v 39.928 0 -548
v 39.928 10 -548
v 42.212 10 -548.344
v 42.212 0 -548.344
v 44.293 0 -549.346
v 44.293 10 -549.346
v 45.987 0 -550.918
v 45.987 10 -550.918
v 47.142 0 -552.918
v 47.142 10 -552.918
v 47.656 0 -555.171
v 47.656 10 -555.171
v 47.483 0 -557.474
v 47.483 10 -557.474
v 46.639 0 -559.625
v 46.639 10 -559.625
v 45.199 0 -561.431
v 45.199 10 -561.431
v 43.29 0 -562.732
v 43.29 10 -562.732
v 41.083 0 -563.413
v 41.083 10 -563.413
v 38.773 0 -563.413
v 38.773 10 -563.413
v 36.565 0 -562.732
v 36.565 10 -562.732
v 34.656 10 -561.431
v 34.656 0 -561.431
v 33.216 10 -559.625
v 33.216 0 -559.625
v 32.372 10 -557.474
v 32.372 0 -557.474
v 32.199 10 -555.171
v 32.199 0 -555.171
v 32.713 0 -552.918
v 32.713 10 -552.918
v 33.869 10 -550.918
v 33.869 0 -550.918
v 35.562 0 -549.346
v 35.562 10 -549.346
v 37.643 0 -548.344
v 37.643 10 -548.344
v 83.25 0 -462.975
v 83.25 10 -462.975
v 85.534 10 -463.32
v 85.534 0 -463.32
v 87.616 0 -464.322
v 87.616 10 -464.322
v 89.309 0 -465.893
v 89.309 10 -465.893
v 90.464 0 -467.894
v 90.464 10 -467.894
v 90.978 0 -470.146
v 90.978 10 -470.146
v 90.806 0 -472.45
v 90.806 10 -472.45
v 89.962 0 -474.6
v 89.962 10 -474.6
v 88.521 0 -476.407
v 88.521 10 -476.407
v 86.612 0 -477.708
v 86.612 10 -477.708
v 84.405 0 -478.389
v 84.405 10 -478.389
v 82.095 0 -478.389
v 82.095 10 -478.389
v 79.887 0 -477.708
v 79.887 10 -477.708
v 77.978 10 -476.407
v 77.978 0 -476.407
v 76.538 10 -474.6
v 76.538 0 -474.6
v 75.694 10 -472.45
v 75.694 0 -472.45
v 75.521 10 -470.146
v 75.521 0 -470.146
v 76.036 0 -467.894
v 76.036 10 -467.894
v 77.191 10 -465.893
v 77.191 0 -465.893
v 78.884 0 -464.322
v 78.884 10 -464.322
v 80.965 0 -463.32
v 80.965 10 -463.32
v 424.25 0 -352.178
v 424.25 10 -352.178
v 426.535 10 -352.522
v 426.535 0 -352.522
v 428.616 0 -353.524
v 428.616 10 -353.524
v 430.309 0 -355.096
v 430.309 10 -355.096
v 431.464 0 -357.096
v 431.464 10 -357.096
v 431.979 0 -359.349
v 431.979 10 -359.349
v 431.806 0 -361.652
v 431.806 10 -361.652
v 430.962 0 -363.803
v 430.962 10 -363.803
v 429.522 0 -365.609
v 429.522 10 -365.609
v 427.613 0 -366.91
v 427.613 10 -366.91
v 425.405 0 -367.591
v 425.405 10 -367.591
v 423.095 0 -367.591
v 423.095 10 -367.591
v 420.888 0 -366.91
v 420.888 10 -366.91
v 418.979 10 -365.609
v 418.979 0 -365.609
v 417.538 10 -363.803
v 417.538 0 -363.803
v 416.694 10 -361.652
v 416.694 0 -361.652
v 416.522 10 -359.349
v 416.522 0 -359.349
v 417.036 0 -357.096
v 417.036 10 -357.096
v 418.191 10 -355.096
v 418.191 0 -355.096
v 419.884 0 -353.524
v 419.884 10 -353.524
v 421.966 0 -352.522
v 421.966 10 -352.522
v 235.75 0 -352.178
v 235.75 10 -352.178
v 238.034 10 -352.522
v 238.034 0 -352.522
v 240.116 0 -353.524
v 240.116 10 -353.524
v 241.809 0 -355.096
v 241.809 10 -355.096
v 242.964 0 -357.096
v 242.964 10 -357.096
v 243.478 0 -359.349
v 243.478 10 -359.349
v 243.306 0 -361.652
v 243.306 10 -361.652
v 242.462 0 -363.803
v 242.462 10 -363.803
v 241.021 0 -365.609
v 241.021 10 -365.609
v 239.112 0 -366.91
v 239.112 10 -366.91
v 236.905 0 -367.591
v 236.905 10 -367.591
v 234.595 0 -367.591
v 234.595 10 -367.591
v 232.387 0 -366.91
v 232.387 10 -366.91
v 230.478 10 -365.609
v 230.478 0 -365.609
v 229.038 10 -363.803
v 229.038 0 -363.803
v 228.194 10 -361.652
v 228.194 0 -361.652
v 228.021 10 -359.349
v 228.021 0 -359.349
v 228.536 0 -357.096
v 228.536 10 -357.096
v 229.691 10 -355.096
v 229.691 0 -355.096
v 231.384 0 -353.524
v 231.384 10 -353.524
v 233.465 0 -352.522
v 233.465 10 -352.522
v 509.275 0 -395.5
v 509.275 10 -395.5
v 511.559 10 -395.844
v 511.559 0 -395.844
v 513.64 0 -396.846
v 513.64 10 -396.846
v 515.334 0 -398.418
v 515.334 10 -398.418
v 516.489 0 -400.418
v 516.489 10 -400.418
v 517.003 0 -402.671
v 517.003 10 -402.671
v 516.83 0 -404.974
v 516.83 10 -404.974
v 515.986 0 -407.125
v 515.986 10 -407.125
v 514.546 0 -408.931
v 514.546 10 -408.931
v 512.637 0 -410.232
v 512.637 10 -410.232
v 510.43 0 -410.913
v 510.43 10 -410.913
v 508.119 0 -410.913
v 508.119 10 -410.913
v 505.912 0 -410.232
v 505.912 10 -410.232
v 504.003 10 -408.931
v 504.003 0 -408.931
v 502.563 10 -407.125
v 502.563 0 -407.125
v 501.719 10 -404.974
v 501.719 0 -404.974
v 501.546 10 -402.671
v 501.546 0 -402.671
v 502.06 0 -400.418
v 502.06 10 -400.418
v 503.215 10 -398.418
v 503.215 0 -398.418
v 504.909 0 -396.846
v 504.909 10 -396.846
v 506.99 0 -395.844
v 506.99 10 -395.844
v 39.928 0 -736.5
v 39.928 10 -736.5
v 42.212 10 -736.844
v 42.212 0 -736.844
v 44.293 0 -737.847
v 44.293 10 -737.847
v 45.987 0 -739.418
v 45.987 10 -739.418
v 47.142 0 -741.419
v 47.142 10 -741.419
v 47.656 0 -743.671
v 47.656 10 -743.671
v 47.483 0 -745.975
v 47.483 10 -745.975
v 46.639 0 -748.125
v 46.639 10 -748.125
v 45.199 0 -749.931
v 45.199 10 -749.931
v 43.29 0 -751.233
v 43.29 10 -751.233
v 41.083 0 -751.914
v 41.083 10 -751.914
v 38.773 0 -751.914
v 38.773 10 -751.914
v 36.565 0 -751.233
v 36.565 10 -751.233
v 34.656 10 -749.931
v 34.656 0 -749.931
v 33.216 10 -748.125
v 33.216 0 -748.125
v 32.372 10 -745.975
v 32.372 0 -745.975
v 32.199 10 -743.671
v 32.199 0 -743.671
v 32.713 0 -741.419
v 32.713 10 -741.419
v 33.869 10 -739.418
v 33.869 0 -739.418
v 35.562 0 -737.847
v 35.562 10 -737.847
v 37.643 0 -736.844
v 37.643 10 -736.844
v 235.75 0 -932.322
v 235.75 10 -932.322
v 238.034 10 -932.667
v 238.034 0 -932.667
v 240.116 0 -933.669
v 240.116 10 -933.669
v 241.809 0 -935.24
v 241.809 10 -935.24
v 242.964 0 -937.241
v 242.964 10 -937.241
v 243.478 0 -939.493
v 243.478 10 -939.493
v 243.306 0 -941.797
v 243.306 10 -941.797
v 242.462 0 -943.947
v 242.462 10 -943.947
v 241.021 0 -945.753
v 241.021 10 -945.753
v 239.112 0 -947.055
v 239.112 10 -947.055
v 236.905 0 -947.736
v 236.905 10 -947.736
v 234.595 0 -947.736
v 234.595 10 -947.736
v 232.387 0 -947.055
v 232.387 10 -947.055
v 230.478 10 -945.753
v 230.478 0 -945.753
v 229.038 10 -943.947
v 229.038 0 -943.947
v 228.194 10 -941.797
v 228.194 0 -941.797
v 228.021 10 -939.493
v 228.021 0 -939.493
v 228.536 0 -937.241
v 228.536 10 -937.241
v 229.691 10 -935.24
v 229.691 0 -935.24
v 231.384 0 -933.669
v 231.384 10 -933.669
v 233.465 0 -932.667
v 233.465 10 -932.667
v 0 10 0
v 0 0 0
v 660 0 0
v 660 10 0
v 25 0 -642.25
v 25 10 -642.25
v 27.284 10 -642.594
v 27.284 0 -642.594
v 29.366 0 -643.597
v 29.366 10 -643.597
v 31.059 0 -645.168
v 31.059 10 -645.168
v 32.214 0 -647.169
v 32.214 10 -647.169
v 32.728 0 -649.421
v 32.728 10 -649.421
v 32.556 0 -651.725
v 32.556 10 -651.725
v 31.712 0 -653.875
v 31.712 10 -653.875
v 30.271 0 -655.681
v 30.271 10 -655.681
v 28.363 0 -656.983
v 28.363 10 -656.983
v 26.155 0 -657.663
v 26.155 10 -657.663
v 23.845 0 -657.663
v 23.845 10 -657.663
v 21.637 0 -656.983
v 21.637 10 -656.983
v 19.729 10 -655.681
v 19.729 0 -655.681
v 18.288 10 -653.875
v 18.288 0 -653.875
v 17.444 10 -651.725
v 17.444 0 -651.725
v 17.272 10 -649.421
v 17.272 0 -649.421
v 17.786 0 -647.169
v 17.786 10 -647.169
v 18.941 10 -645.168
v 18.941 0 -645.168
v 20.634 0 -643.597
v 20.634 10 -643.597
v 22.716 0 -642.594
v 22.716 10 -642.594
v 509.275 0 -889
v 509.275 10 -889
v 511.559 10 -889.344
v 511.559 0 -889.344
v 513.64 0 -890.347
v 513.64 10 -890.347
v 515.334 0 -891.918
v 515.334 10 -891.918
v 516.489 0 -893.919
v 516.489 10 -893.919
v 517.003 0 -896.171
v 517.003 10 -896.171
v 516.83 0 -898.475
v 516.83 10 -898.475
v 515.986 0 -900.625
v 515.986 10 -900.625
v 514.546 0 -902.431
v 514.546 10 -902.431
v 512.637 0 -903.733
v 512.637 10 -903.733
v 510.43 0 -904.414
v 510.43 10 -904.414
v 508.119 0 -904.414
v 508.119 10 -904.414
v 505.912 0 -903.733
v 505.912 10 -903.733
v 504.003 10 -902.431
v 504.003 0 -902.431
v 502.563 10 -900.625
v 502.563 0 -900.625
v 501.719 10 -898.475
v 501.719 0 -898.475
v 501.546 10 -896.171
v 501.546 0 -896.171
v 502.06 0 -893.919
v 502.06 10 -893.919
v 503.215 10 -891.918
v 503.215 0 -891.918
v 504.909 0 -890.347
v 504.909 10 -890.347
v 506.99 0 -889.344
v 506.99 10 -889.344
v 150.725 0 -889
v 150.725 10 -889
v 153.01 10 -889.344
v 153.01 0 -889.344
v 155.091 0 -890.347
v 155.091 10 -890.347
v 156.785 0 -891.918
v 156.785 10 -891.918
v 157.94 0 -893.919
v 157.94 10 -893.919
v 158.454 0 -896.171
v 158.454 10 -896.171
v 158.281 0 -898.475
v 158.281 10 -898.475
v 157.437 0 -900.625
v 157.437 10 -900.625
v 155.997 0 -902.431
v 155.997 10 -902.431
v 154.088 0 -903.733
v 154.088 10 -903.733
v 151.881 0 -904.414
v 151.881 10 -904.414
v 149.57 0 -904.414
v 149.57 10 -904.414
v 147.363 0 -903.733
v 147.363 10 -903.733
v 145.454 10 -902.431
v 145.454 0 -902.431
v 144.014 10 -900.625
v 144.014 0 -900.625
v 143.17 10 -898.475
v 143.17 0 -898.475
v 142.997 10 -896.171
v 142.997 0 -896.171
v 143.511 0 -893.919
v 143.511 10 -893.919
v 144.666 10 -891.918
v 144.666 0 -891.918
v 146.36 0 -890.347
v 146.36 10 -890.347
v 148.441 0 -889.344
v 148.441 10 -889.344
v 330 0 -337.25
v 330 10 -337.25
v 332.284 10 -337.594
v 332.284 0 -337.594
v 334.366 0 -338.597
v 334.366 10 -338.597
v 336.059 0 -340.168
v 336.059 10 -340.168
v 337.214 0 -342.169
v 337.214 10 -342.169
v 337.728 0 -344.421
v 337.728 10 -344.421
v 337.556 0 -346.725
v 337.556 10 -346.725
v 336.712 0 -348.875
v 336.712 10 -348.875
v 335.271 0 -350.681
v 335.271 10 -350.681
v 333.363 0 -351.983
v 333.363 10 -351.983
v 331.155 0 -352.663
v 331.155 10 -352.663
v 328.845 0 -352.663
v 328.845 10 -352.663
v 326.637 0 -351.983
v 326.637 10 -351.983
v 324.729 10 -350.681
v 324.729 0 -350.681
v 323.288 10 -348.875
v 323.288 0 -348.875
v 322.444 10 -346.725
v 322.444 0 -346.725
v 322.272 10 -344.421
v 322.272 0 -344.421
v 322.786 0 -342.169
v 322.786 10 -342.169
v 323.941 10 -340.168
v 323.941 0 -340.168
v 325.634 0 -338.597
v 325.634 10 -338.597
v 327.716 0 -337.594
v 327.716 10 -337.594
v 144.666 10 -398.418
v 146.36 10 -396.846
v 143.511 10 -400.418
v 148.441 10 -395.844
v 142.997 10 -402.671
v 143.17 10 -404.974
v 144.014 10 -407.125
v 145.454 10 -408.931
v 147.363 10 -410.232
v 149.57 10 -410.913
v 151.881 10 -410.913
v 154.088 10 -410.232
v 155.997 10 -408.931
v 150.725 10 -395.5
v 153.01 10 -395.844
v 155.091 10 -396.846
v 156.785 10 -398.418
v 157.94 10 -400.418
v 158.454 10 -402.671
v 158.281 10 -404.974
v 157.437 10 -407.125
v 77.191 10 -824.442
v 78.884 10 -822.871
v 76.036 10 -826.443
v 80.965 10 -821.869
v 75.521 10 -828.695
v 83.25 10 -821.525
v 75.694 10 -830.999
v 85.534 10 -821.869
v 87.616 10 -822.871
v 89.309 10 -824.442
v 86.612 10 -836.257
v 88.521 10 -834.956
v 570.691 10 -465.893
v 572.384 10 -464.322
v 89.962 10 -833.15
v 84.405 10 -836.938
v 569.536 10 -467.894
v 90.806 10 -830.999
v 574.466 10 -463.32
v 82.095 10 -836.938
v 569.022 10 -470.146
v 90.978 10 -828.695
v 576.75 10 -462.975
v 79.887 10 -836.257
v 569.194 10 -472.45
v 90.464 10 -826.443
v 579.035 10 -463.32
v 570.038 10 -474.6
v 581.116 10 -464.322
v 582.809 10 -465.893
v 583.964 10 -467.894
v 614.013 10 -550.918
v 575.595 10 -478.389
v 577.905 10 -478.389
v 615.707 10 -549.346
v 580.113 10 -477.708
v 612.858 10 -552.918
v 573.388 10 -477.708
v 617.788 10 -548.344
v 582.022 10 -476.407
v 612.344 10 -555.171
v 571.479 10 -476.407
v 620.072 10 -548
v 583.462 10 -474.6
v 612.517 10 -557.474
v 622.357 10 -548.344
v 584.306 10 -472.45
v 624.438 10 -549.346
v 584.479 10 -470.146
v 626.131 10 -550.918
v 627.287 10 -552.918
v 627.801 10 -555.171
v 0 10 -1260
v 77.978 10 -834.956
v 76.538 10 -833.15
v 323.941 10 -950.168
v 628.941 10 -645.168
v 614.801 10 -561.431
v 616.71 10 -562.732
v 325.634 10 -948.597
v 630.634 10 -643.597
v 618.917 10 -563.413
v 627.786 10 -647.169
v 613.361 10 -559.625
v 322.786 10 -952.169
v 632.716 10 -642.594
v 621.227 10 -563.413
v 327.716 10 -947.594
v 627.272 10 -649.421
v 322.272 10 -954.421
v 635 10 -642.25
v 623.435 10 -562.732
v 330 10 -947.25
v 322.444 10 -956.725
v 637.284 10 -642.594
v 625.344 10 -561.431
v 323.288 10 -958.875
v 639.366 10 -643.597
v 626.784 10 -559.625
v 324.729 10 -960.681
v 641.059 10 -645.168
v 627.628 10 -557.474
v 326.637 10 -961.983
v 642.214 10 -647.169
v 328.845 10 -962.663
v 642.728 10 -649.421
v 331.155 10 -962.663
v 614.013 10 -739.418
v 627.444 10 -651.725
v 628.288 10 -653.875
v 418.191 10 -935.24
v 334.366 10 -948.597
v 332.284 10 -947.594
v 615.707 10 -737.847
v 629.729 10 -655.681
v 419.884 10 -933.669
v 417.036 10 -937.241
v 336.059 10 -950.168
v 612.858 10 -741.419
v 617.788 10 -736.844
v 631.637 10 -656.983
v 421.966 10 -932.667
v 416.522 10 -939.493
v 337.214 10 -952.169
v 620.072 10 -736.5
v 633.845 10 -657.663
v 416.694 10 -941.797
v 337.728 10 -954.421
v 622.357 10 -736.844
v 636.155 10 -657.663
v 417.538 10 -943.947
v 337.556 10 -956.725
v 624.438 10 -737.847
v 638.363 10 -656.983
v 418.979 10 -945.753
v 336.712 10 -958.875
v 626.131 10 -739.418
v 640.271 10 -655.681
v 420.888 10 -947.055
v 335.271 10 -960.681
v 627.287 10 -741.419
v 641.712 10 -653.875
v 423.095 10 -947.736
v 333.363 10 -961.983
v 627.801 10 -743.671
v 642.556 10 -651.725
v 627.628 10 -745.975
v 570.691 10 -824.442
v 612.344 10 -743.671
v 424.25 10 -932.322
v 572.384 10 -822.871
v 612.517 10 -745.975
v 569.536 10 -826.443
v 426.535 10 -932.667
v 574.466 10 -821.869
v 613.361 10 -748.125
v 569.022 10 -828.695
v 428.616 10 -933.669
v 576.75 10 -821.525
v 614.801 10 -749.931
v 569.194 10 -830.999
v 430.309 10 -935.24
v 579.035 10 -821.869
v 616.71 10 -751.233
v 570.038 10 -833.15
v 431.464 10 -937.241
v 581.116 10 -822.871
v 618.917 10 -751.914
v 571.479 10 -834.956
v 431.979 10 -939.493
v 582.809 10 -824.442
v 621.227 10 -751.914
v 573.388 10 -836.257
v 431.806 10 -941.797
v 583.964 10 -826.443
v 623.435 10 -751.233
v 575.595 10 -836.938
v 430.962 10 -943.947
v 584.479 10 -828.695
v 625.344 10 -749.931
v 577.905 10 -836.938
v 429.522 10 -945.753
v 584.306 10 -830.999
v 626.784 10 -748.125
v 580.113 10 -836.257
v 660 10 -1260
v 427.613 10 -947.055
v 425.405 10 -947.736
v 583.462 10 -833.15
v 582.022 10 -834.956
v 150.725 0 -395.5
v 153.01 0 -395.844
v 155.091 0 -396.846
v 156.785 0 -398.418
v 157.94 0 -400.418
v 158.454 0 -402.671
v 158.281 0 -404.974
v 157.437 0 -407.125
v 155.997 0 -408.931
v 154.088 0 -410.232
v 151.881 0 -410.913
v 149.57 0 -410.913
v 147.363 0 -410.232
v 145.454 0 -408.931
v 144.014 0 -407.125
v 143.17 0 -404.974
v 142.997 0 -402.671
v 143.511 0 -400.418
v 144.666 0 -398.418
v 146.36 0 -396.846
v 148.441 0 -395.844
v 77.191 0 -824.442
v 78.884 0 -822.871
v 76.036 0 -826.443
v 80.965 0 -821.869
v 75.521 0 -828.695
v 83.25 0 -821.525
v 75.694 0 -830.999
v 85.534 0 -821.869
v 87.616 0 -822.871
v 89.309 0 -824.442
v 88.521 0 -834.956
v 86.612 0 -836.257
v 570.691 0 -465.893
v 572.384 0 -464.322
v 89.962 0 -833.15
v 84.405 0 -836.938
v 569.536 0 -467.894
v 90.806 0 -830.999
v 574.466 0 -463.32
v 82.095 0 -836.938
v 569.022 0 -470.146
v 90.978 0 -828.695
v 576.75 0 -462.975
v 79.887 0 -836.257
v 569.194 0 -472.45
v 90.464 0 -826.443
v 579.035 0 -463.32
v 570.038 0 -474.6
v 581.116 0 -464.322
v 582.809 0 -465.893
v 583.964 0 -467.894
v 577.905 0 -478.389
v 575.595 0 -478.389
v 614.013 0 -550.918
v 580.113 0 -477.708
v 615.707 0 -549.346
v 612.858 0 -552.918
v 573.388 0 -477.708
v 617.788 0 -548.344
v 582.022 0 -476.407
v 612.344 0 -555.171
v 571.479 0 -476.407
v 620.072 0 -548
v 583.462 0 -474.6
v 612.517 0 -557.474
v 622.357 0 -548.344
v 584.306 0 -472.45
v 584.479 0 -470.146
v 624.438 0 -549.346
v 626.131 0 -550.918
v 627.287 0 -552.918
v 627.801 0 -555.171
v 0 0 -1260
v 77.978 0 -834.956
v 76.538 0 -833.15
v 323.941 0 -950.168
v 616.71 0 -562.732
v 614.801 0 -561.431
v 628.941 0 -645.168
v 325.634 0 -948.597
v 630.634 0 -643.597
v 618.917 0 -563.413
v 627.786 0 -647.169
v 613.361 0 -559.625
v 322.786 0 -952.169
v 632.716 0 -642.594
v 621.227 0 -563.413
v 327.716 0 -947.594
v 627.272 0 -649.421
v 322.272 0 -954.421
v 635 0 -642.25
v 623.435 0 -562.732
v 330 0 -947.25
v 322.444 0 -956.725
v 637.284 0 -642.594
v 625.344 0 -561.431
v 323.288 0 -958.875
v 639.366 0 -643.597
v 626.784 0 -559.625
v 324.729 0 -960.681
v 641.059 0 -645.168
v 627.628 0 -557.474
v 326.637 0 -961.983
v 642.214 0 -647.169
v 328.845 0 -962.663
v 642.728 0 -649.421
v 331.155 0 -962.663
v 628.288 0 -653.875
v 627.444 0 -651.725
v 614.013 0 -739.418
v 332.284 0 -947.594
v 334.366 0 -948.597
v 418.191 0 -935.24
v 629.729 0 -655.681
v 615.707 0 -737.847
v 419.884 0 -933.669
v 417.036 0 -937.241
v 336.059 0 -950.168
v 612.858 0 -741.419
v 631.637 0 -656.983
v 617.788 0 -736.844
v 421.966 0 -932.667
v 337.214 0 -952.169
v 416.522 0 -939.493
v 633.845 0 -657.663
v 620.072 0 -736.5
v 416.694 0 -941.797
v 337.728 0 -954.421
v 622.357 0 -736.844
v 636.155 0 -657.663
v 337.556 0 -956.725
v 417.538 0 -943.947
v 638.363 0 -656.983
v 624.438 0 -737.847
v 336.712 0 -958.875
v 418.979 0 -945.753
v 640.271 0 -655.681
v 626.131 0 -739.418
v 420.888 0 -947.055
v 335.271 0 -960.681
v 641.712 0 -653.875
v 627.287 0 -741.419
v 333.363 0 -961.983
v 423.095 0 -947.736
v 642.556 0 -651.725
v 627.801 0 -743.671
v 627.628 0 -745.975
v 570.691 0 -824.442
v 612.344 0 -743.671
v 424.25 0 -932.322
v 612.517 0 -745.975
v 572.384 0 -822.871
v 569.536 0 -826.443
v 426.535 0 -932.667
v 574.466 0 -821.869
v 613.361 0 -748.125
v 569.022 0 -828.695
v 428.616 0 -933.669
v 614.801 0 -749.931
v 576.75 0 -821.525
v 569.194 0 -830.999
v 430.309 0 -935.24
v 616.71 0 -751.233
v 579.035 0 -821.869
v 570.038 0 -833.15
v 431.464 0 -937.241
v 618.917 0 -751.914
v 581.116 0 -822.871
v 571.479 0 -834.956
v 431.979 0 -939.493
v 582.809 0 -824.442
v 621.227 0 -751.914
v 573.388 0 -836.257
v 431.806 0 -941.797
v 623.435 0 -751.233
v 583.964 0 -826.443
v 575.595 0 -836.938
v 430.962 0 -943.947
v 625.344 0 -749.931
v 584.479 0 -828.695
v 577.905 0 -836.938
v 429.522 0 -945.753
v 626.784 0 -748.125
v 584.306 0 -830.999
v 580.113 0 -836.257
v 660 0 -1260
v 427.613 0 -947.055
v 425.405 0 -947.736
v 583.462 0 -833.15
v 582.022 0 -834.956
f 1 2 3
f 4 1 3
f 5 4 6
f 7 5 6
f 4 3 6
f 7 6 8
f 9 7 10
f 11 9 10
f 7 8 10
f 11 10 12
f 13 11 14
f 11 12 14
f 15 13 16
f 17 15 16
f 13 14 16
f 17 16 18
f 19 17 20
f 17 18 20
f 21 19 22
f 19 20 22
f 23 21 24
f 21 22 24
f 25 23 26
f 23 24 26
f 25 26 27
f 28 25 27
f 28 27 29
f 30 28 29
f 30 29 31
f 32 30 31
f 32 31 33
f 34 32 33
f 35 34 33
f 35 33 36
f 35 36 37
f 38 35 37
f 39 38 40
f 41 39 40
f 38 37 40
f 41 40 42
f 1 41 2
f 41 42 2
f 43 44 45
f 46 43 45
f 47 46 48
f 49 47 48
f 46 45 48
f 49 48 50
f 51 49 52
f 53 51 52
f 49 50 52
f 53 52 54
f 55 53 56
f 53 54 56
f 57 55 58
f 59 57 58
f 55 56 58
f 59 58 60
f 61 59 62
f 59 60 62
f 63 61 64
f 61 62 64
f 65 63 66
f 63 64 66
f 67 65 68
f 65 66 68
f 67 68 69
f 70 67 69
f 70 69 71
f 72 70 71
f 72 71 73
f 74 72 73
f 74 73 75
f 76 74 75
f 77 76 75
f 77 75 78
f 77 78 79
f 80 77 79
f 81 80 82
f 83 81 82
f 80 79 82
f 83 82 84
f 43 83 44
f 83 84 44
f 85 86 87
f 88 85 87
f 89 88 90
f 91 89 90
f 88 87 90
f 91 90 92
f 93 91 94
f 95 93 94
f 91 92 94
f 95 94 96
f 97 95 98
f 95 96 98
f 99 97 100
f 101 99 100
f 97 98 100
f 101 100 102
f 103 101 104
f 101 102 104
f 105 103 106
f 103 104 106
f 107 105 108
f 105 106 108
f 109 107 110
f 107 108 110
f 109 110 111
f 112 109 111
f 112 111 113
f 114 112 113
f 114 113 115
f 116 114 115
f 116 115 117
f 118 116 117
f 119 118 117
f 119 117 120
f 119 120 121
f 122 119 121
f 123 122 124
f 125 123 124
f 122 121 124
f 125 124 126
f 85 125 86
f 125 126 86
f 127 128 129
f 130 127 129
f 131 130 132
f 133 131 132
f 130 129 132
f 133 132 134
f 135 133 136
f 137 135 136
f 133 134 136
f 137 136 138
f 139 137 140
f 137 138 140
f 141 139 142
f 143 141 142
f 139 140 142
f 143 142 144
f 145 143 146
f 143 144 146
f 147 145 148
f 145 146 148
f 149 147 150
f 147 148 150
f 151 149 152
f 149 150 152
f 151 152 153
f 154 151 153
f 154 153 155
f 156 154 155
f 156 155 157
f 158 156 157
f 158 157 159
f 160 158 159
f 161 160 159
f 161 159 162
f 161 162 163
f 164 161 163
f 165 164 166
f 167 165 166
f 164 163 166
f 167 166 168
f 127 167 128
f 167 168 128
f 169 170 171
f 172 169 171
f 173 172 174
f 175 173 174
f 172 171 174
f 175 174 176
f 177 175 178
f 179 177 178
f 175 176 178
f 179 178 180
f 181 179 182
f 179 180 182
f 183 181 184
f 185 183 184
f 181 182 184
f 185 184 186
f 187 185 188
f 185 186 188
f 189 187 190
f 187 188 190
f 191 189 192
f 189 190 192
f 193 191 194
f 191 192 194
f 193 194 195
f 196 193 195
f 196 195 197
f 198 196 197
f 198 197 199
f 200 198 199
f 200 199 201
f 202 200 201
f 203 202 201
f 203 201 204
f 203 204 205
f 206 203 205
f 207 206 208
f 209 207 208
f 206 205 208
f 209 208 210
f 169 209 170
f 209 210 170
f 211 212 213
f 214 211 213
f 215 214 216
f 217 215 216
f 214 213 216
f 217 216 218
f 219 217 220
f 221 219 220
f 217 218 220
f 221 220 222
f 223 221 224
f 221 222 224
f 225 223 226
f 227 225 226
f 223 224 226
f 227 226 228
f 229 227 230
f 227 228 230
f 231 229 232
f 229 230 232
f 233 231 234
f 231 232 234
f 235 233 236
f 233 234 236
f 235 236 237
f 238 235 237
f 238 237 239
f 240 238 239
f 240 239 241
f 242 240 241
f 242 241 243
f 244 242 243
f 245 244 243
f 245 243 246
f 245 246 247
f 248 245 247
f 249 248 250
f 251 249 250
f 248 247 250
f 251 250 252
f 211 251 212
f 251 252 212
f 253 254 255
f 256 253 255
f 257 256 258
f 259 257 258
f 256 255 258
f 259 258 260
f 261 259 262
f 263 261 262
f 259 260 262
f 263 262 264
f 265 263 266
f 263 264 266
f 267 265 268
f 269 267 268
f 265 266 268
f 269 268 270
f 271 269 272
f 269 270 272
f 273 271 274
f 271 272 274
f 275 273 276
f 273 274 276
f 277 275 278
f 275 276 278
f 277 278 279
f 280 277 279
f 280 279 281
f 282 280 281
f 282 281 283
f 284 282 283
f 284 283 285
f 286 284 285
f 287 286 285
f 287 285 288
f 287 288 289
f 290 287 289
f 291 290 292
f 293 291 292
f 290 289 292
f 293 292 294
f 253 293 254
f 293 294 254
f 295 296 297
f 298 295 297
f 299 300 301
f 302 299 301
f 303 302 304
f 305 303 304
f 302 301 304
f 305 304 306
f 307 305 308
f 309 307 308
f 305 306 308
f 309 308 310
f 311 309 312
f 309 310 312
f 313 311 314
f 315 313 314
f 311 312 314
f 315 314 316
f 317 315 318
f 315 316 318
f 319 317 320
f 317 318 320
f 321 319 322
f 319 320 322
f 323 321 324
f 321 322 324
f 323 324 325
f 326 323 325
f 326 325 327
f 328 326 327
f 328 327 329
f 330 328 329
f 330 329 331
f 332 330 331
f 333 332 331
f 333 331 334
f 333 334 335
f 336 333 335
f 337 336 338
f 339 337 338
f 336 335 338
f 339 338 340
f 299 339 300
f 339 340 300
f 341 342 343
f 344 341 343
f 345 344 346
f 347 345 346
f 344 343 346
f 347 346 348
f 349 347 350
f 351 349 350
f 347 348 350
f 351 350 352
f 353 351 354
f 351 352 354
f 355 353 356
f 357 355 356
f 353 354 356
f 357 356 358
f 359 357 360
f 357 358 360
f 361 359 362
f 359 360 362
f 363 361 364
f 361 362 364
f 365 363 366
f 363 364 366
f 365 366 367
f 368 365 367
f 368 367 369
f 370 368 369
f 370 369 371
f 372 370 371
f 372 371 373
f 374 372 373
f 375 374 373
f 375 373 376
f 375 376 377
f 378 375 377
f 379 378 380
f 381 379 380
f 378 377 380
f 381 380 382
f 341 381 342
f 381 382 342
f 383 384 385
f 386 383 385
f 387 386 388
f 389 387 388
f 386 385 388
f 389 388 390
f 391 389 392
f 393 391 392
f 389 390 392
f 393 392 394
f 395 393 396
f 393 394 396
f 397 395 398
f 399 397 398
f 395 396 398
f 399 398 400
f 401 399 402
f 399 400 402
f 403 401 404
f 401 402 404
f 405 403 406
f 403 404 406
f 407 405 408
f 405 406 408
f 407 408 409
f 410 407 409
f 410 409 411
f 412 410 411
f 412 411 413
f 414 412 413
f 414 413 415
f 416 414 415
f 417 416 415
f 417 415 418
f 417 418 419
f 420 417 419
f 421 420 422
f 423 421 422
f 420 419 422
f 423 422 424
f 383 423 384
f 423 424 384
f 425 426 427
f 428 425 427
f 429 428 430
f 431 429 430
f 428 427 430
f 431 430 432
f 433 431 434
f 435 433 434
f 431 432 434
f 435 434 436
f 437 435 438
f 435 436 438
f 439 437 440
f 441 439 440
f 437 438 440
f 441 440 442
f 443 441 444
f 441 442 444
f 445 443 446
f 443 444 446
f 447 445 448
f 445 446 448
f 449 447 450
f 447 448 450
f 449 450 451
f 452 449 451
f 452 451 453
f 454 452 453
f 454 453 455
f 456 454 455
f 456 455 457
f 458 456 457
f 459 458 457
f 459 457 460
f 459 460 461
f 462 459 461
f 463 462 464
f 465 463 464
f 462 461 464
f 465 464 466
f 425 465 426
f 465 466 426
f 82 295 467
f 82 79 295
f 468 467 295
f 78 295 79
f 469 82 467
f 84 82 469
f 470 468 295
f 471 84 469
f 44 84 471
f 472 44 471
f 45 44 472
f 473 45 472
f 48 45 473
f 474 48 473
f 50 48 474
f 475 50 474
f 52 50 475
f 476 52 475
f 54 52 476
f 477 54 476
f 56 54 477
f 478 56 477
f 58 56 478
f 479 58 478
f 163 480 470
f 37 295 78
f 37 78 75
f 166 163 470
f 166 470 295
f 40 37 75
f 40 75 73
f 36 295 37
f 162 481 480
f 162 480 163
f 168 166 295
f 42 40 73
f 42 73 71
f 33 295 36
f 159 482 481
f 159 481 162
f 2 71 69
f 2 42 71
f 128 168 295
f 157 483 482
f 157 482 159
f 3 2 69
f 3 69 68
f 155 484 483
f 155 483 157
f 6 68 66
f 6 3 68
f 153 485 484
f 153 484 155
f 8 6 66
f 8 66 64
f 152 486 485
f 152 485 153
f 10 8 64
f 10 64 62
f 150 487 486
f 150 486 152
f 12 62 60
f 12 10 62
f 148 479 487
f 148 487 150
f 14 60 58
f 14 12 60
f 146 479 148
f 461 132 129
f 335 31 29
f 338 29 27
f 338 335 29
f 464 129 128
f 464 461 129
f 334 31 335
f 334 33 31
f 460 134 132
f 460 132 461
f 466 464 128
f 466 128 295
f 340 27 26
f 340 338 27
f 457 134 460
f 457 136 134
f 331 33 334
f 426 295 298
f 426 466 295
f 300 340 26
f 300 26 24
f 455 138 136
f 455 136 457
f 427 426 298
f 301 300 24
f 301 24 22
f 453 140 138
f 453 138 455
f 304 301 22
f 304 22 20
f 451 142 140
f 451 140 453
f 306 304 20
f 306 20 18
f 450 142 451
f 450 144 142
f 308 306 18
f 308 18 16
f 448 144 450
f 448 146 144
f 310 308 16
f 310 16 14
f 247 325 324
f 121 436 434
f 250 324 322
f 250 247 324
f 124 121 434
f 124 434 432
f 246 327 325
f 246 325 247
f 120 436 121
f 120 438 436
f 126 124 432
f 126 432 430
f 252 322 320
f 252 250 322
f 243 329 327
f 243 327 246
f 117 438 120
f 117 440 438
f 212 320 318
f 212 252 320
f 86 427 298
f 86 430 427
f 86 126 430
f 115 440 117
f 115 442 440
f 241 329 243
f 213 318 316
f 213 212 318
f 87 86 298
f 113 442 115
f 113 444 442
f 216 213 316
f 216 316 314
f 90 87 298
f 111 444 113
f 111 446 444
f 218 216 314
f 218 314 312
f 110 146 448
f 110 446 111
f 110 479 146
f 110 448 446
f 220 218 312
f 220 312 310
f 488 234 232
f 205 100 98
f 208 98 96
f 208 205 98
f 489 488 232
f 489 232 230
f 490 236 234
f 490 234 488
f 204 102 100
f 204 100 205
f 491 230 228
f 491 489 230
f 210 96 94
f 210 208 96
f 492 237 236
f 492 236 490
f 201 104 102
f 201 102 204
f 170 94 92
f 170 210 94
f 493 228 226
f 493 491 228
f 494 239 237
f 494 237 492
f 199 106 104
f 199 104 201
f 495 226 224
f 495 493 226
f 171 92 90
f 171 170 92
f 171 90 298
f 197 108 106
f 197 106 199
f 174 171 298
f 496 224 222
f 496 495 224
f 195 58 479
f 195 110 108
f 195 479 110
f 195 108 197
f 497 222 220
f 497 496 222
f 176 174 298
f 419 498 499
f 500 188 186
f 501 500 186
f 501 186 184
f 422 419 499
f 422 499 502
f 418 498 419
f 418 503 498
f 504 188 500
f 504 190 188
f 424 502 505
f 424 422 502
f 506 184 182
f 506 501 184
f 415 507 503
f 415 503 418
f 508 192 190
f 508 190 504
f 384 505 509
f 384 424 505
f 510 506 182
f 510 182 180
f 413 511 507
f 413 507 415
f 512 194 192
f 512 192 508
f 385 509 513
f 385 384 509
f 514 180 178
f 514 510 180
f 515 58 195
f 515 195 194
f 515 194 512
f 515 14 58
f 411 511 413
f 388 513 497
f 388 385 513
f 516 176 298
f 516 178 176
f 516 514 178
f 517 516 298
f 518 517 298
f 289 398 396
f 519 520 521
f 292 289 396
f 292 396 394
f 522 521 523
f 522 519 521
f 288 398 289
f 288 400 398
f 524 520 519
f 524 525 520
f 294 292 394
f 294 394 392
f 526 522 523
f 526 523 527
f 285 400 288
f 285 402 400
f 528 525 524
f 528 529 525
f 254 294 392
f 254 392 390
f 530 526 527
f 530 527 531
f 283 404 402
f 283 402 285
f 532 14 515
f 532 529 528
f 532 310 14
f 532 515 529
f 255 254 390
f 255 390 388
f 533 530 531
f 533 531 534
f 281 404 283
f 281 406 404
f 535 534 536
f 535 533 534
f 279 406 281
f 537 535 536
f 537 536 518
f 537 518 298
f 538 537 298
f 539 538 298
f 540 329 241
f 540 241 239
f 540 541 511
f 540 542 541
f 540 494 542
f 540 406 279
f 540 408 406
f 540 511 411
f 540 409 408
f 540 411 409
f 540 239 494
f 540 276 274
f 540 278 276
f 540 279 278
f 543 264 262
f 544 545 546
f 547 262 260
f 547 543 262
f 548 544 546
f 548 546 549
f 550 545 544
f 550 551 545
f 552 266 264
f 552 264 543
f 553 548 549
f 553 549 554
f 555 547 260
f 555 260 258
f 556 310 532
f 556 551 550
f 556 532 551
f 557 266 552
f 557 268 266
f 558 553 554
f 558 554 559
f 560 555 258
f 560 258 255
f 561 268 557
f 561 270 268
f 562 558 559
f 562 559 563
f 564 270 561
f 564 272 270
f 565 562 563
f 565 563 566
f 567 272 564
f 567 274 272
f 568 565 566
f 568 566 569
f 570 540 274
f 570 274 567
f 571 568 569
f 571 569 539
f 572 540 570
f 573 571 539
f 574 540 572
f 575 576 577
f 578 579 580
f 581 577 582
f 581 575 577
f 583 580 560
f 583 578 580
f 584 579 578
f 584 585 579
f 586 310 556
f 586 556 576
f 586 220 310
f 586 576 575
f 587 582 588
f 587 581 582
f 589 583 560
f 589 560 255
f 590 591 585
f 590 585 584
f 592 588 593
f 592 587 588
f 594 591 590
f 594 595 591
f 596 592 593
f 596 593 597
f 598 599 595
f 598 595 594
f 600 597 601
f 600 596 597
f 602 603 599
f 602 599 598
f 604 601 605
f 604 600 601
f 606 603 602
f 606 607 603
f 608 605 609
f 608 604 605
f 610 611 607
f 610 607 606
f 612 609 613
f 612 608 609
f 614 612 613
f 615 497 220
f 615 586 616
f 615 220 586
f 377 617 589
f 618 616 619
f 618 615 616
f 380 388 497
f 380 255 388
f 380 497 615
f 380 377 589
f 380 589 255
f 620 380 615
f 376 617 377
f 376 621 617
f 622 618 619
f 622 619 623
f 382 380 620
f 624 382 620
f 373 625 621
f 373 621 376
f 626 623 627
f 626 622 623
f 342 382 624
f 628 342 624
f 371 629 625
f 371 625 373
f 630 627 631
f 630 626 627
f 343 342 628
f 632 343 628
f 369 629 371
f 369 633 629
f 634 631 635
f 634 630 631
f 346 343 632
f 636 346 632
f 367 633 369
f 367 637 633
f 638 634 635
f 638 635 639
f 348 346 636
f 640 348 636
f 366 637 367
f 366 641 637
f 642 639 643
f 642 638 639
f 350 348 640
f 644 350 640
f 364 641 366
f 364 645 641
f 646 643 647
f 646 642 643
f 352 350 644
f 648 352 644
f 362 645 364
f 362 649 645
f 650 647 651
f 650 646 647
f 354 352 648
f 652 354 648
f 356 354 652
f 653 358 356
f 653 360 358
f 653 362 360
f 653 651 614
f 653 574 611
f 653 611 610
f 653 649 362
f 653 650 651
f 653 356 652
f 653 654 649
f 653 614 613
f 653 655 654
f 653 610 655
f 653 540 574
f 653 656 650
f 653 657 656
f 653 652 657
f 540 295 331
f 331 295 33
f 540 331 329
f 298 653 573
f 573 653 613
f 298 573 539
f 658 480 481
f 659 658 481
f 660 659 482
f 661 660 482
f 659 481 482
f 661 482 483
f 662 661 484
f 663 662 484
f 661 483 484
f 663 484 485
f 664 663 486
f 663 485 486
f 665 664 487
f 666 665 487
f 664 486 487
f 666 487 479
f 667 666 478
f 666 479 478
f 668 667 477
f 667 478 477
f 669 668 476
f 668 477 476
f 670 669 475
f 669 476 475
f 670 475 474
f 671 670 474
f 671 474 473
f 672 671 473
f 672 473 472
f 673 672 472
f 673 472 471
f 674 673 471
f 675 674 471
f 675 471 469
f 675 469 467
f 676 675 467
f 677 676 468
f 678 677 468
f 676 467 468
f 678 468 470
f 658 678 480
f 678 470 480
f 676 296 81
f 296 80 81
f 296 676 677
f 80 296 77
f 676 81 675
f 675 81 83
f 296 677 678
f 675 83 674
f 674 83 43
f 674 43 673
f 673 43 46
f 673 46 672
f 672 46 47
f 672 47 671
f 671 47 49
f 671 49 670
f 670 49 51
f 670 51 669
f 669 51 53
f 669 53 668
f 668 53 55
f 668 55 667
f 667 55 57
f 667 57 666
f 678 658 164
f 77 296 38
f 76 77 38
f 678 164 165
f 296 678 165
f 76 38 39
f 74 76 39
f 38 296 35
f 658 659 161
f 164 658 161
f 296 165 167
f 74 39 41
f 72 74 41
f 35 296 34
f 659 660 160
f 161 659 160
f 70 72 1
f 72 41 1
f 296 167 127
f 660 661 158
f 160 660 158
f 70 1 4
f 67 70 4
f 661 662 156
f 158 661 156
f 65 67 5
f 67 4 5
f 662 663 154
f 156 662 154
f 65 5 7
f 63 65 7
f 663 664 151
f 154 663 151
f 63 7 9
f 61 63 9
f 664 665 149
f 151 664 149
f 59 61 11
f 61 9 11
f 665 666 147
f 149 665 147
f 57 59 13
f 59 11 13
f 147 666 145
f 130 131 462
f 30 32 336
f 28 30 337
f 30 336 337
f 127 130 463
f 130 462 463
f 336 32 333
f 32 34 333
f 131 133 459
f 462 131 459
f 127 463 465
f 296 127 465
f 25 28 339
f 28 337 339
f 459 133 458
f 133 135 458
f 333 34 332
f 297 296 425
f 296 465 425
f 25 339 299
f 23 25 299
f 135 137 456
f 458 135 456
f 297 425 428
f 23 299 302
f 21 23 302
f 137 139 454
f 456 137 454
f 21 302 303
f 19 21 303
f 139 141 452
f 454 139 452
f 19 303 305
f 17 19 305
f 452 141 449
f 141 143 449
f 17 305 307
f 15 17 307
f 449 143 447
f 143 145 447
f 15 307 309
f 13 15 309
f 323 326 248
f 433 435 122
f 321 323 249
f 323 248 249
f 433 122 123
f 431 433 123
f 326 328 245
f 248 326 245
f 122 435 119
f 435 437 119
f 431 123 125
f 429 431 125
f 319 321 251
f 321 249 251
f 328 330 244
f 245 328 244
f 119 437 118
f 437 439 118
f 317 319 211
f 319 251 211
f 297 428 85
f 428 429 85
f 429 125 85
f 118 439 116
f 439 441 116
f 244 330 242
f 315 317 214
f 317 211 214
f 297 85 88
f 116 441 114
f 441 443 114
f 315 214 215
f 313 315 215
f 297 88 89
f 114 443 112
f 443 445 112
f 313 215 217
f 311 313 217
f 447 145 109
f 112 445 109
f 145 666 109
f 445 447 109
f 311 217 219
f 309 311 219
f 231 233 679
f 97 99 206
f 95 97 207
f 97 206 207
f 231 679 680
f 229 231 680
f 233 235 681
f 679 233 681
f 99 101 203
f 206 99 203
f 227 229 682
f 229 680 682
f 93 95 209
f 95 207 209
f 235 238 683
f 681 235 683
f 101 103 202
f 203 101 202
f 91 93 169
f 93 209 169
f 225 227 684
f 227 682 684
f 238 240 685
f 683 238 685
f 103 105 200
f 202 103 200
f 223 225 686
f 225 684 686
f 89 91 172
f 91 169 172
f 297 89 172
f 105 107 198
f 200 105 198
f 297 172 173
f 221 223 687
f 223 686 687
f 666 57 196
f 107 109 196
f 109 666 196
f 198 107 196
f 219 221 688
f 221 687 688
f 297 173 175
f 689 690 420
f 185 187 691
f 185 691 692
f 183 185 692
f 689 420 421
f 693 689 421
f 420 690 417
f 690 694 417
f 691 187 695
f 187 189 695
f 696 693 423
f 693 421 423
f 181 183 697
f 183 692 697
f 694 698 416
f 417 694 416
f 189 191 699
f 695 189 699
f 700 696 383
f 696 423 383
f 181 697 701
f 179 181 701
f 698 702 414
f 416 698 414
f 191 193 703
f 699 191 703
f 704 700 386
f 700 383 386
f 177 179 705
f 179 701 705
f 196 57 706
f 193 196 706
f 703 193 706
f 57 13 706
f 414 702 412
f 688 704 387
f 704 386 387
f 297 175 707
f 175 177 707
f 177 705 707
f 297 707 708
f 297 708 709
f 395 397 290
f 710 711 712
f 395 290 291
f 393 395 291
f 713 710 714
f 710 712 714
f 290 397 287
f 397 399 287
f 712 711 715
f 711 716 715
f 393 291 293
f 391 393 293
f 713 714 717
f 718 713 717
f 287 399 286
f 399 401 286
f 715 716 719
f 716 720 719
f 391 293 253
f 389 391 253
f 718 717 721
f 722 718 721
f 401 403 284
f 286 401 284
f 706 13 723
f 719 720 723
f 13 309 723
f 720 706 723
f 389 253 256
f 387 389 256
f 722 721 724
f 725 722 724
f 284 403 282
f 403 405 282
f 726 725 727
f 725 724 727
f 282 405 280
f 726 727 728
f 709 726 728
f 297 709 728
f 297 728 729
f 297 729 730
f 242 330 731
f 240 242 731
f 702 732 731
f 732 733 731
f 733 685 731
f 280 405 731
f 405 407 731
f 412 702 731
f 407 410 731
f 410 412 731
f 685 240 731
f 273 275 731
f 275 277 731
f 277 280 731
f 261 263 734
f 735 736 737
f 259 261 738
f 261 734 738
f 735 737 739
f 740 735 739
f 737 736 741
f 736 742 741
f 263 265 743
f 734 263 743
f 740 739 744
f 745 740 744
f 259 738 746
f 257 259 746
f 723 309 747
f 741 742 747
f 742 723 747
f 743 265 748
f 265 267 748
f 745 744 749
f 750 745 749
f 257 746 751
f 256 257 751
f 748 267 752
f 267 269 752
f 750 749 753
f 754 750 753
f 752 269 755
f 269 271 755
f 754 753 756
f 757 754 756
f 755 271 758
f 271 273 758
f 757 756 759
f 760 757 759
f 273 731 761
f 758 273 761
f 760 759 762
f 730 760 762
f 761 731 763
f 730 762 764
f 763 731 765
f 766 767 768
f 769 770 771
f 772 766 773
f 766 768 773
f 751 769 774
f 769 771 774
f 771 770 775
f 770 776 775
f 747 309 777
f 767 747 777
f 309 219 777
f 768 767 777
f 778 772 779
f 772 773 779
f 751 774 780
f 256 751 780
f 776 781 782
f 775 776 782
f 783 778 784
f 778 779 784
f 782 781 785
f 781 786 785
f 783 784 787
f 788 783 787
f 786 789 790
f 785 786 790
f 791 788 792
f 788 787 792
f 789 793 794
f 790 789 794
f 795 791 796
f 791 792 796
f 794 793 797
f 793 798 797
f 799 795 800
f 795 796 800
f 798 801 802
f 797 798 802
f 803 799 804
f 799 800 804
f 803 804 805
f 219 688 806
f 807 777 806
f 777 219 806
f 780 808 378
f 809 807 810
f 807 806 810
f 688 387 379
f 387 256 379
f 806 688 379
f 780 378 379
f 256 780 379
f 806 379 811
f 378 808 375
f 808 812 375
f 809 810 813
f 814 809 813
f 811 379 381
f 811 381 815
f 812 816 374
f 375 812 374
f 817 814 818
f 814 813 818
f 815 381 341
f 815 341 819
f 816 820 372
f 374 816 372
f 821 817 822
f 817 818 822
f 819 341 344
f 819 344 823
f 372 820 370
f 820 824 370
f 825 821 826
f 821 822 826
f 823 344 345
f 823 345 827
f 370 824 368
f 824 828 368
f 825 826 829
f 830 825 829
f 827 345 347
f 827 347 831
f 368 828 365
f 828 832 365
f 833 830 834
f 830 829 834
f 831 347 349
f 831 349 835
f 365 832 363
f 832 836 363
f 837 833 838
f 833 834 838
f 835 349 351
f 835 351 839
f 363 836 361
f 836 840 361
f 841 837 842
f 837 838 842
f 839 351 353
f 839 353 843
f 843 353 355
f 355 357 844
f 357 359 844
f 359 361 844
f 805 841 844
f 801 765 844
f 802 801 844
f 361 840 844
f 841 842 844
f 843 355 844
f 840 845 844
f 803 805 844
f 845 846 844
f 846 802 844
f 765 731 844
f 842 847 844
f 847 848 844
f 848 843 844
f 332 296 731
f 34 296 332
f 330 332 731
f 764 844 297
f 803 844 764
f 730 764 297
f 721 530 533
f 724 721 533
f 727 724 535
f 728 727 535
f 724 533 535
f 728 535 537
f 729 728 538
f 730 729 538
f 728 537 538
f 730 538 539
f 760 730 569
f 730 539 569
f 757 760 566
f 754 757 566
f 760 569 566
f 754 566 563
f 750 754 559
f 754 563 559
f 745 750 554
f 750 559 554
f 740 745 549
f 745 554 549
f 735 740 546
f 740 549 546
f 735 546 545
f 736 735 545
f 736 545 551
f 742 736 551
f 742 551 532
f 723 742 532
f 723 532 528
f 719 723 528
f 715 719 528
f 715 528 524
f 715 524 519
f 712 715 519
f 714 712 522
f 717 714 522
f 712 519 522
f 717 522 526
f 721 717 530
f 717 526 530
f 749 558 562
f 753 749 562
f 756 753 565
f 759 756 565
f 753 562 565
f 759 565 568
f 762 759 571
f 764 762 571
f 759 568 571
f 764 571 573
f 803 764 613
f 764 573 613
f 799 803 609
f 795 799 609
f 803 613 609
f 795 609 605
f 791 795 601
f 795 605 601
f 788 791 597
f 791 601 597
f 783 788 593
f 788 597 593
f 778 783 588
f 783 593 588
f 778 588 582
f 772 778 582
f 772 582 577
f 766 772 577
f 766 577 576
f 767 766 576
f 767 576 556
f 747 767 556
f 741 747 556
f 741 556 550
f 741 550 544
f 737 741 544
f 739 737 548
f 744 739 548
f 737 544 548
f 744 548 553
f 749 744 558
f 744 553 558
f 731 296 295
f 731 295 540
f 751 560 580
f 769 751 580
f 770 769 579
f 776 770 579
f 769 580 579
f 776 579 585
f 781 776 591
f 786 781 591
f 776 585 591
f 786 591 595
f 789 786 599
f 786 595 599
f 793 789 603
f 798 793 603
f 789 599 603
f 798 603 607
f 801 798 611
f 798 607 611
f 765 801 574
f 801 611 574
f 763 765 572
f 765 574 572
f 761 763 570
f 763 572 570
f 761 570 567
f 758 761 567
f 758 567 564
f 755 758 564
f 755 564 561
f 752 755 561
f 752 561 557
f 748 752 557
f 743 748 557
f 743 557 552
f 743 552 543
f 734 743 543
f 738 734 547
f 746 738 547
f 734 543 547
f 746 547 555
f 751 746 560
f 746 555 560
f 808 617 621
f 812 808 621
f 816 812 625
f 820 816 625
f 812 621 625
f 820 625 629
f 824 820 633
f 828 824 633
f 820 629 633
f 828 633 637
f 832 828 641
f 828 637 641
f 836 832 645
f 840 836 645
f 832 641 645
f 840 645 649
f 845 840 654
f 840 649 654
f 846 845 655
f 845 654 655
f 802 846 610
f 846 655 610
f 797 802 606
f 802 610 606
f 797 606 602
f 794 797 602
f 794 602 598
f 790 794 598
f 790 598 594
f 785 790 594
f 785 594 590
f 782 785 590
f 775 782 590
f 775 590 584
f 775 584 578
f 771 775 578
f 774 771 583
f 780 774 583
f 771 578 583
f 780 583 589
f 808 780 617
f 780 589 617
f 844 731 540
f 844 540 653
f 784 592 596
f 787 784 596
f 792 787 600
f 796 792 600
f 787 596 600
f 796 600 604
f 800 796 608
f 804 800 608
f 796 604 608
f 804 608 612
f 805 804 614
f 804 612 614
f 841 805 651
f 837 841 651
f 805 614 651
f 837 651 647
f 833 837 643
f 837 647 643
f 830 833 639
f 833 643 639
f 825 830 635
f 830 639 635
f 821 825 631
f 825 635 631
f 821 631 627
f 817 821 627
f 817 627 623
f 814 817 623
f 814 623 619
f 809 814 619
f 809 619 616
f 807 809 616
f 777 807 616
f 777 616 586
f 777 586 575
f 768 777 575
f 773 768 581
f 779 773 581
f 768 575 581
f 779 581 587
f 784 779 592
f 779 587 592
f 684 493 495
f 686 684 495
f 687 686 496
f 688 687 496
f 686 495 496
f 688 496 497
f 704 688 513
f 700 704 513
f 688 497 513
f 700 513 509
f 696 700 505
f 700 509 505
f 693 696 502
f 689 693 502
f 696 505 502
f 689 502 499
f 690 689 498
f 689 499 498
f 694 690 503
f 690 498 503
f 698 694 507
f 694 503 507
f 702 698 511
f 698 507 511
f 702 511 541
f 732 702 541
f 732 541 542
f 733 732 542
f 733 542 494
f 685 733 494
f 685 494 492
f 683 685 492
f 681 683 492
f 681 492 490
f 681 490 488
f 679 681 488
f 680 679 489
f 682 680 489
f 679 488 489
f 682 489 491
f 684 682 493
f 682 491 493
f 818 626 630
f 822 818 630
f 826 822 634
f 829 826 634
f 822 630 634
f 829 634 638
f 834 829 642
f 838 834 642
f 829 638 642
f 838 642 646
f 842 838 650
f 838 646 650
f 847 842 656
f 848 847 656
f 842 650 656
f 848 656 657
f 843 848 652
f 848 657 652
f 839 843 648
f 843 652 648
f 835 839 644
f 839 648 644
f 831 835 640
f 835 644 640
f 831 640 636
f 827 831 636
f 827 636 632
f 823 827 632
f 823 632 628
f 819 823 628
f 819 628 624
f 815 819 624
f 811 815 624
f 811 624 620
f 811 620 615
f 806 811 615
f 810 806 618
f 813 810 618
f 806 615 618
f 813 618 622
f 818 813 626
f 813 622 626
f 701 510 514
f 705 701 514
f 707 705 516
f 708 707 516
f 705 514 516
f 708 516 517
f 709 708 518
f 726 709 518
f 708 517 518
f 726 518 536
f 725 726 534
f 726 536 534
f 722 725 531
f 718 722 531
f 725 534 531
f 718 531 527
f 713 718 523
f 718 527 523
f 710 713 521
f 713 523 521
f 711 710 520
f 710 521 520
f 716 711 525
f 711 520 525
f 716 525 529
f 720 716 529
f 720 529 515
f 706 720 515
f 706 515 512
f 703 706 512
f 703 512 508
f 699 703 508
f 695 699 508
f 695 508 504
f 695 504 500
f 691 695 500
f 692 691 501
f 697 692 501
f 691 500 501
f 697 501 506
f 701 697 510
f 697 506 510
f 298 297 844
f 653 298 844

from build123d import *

# Parameters (mm, degrees)
ESQUISSE1_W             = 660
ESQUISSE1_H             = 1260
BOSS_EXTRU_1_DEPTH      = 10
ESQUISSE2_R             = 7.75
ENL_V_MAT_EXTRU_1_DEPTH = 10


with BuildPart() as part:
    # Esquisse1 → Boss.-Extru.1 (new body)
    with BuildSketch(Plane(origin=(0, 0, 0), x_dir=(1, 0, 0), z_dir=(0, 1, 0))):
        with Locations((330, 630)):
            Rectangle(ESQUISSE1_W, ESQUISSE1_H)
    extrude(amount=BOSS_EXTRU_1_DEPTH)

    # Esquisse2 → Enlèv. mat.-Extru.1 (cut)
    with BuildSketch(Plane(origin=(0, 10, 0), x_dir=(1, 0, 0), z_dir=(0, 1, 0))):
        with Locations(Location((25, 650, 0), (0, 0, 270))):
            Circle(ESQUISSE2_R)
        with Locations(Location((39.92776253, 744.250183284, 0), (0, 0, 270))):
            Circle(ESQUISSE2_R)
        with Locations(Location((83.249816716, 829.274501949, 0), (0, 0, 270))):
            Circle(ESQUISSE2_R)
        with Locations(Location((150.725498051, 896.750183284, 0), (0, 0, 270))):
            Circle(ESQUISSE2_R)
        with Locations(Location((235.749816716, 940.07223747, 0), (0, 0, 270))):
            Circle(ESQUISSE2_R)
        with Locations(Location((330, 955, 0), (0, 0, 270))):
            Circle(ESQUISSE2_R)
        with Locations(Location((424.250183284, 940.07223747, 0), (0, 0, 270))):
            Circle(ESQUISSE2_R)
        with Locations(Location((509.274501949, 896.750183284, 0), (0, 0, 270))):
            Circle(ESQUISSE2_R)
        with Locations(Location((576.750183284, 829.274501949, 0), (0, 0, 270))):
            Circle(ESQUISSE2_R)
        with Locations(Location((620.07223747, 744.250183284, 0), (0, 0, 270))):
            Circle(ESQUISSE2_R)
        with Locations(Location((635, 650, 0), (0, 0, 270))):
            Circle(ESQUISSE2_R)
        with Locations(Location((620.07223747, 555.749816716, 0), (0, 0, 270))):
            Circle(ESQUISSE2_R)
        with Locations(Location((576.750183284, 470.725498051, 0), (0, 0, 270))):
            Circle(ESQUISSE2_R)
        with Locations(Location((509.274501949, 403.249816716, 0), (0, 0, 270))):
            Circle(ESQUISSE2_R)
        with Locations(Location((424.250183284, 359.92776253, 0), (0, 0, 270))):
            Circle(ESQUISSE2_R)
        with Locations(Location((330, 345, 0), (0, 0, 270))):
            Circle(ESQUISSE2_R)
        with Locations(Location((235.749816716, 359.92776253, 0), (0, 0, 270))):
            Circle(ESQUISSE2_R)
        with Locations(Location((150.725498051, 403.249816716, 0), (0, 0, 270))):
            Circle(ESQUISSE2_R)
        with Locations(Location((83.249816716, 470.725498051, 0), (0, 0, 270))):
            Circle(ESQUISSE2_R)
        with Locations(Location((39.92776253, 555.749816716, 0), (0, 0, 270))):
            Circle(ESQUISSE2_R)
    extrude(amount=-ENL_V_MAT_EXTRU_1_DEPTH, mode=Mode.SUBTRACT)


solid = part.part
